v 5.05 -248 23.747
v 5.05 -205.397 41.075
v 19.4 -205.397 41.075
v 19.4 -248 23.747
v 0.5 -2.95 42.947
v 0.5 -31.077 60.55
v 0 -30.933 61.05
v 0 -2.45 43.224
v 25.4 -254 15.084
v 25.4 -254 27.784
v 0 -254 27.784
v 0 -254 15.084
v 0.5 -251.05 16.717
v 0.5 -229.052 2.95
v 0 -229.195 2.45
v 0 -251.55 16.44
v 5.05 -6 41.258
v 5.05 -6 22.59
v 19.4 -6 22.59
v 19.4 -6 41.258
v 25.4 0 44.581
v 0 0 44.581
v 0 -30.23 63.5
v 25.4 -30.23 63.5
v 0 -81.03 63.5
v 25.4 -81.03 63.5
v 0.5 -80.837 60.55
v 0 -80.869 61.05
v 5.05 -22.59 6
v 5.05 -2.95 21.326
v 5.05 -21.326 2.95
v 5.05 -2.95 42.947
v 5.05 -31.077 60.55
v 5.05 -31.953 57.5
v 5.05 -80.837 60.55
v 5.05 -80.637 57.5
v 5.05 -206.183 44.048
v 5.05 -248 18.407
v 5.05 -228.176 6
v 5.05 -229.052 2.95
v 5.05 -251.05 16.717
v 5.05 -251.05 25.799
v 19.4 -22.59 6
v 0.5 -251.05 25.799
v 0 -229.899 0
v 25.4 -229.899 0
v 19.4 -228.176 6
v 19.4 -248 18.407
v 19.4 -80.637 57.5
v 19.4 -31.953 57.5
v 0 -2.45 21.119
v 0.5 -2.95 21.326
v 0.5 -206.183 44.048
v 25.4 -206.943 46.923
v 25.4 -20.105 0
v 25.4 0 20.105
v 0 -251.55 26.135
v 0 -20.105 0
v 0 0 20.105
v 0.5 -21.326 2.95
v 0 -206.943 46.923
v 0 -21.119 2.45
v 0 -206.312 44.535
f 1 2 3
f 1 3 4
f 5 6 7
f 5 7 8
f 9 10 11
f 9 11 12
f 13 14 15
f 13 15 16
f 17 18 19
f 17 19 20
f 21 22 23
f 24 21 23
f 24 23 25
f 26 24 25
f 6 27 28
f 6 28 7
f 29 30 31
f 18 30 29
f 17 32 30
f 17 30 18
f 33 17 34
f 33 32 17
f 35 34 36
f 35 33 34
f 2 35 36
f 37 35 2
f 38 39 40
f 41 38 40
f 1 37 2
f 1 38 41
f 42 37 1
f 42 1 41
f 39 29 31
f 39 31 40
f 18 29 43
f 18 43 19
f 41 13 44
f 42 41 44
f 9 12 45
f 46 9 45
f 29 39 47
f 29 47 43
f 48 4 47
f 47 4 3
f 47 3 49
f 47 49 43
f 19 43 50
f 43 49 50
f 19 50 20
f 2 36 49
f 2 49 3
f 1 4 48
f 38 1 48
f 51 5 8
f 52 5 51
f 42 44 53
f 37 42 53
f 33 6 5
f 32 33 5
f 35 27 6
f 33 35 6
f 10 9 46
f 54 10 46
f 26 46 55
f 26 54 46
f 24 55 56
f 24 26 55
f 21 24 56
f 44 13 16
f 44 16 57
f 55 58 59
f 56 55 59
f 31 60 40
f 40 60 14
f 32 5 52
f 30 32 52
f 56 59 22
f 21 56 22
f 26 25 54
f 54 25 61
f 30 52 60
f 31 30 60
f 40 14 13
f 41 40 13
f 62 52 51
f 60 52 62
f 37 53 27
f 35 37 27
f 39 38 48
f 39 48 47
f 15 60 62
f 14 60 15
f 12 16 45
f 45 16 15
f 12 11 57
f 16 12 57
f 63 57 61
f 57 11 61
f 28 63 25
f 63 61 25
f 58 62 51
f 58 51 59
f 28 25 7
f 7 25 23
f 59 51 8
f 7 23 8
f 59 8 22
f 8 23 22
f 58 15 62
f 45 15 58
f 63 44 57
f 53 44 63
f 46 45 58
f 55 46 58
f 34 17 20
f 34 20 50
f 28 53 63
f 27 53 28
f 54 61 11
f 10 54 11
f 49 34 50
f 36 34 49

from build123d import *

# Parameters (mm, degrees)
PAD002_DEPTH    = 25.4
THICKNESS001_T  = -6
POCKET_DEPTH    = 5.05
CHAMFER001_SIZE = 0.5


with BuildPart() as part:
    # Sketch002 → Pad002 (new body)
    with BuildSketch(Plane.YZ):
        Polygon((-229.898747, 0), (-20.104522, 0), (0, 20.104522), (0, 44.580842), (-30.23, 63.5), (-81.03, 63.5), (-206.943497, 46.923174), (-254, 27.78354), (-254, 15.08354), align=None)
    extrude(amount=PAD002_DEPTH)

    # Thickness001
    thickness001_openings = [part.faces().sort_by_distance(p)[0] for p in [
        (0, -116.810873, 28.186462),
    ]]
    offset(amount=THICKNESS001_T, openings=thickness001_openings, kind=Kind.INTERSECTION)

    # Sketch003 (on Face11 of Thickness001) → Pocket (cut)
    with BuildSketch(Plane.YZ):
        Polygon((-251.05, 25.798733), (-206.182908, 44.047852), (-80.836647, 60.55), (-31.077013, 60.55), (-2.95, 42.946976), (-2.95, 21.326452), (-21.326452, 2.95), (-229.051734, 2.95), (-251.05, 16.717406), align=None)
        Polygon((-80.636739, 57.5), (-31.952739, 57.5), (-6, 41.257725), (-6, 22.589803), (-22.589803, 6), (-228.176008, 6), (-248, 18.406657), (-248, 23.746644), (-205.396535, 41.075061), align=None, mode=Mode.SUBTRACT)
    extrude(amount=POCKET_DEPTH, mode=Mode.SUBTRACT)

    # Chamfer001
    chamfer001_edges = [part.edges().sort_by_distance(p)[0] for p in [
        (0, -17.013507, 51.748488),
        (0, -55.95683, 60.55),
        (0, -143.509777, 52.298926),
        (0, -228.616454, 34.923292),
        (0, -251.05, 21.25807),
        (0, -240.050867, 9.833703),
        (0, -125.189093, 2.95),
        (0, -12.138226, 12.138226),
        (0, -2.95, 32.136714),
    ]]
    chamfer(chamfer001_edges, length=CHAMFER001_SIZE)


solid = part.part
